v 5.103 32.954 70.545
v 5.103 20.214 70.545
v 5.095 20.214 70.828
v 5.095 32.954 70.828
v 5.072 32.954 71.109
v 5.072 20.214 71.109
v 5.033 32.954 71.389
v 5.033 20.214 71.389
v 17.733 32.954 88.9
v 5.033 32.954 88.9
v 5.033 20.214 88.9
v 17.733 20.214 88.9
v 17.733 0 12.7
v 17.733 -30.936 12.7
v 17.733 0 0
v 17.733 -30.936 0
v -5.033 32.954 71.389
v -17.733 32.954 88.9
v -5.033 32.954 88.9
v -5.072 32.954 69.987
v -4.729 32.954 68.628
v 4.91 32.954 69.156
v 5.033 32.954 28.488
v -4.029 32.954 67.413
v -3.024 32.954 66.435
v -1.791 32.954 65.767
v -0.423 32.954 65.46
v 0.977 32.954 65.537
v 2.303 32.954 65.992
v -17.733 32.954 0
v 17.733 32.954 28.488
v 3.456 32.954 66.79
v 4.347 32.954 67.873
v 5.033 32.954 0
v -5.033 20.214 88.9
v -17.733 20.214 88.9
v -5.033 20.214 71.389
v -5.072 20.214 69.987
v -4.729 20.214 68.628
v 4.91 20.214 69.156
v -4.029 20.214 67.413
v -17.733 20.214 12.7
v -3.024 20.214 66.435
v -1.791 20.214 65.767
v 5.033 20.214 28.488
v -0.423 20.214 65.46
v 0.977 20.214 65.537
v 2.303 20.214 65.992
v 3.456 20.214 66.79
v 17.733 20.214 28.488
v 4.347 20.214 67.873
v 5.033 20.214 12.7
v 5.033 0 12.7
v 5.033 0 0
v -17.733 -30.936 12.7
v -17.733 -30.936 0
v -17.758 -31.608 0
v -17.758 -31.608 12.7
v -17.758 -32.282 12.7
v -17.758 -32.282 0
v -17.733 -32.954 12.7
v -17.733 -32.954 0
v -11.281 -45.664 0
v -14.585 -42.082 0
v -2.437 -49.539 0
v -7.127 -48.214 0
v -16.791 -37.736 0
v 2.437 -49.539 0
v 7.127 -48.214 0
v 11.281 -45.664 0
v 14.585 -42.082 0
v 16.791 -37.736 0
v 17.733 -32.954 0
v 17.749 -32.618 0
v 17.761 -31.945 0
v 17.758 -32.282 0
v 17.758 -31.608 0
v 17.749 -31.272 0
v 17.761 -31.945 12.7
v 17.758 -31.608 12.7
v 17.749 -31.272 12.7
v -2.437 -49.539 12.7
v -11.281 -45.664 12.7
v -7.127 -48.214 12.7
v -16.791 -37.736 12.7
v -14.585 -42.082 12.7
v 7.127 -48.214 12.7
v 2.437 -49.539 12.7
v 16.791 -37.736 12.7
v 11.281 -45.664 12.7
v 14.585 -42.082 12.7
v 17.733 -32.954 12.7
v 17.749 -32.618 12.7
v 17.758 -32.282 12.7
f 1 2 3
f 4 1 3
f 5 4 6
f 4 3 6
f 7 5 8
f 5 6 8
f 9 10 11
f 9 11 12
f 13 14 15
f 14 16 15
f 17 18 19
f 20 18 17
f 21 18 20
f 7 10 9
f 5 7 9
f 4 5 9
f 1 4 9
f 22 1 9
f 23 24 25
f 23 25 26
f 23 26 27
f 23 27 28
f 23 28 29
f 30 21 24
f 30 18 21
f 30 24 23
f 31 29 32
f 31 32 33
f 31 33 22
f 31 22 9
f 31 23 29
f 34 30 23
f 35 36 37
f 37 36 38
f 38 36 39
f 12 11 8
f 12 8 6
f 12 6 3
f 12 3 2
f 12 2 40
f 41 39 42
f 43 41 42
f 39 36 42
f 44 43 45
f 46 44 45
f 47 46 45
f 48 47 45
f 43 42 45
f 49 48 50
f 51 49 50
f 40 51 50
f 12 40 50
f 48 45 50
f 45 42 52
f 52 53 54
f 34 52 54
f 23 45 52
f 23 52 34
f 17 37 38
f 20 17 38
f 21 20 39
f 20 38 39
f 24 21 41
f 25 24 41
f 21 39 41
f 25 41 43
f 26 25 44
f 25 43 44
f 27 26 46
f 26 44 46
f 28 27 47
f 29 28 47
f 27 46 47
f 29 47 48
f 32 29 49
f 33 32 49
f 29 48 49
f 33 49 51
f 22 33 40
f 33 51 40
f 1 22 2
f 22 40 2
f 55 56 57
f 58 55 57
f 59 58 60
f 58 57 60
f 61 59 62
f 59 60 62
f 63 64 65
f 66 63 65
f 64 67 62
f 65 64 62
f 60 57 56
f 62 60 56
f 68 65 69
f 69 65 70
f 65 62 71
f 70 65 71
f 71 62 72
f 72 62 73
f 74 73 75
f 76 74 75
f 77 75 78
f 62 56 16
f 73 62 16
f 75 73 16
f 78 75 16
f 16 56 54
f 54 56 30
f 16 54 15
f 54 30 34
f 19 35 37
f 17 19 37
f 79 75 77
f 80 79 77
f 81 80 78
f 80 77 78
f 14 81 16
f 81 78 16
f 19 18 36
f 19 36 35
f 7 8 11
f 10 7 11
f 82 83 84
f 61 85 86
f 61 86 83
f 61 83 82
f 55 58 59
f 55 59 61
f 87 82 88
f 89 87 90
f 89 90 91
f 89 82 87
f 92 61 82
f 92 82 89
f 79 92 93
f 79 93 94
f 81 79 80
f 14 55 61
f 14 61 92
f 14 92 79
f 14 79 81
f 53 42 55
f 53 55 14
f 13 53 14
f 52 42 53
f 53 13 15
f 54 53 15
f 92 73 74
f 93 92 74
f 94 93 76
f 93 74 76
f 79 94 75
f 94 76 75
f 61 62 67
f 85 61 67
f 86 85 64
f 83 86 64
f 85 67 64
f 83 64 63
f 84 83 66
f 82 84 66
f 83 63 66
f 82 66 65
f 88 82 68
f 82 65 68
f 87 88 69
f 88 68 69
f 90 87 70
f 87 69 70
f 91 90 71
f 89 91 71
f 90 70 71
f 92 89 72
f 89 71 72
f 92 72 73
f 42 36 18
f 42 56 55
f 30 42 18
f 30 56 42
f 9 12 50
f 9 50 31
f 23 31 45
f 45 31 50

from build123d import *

# Parameters (mm, degrees)
F1_DEPTH = 12.7
F2_W     = 35.4655683041
F2_H     = 12.740496546
F3_DEPTH = 76.2
F5_DEPTH = 25.4
F7_DEPTH = 12.7


with BuildPart() as f1:
    # F0 (on Top) → F1 (new body)
    with BuildSketch(Plane.XY):
        with BuildLine():
            Line((-17.732784152, -30.9358154462), (-17.732784152, -32.9542048275))
            Line((-17.732784152, -32.9542048275), (17.732784152, -32.9542048275))
            Line((17.732784152, -32.9542048275), (17.732784152, -30.9358154462))
            ThreePointArc((17.732784152, -30.9358154462), (0, -14.1835319409), (-17.732784152, -30.9358154462))
        make_face()
        with BuildLine():
            ThreePointArc((-17.732784152, -30.9358154462), (-17.761478196, -31.9450101369), (-17.732784152, -32.9542048275))
            Line((-17.732784152, -32.9542048275), (-17.732784152, -30.9358154462))
        make_face()
        with BuildLine():
            Line((17.732784152, -32.9542048275), (-17.732784152, -32.9542048275))
            ThreePointArc((-17.732784152, -32.9542048275), (0, -49.7064883328), (17.732784152, -32.9542048275))
        make_face()
        with BuildLine():
            Line((17.732784152, -30.9358154462), (17.732784152, -32.9542048275))
            ThreePointArc((17.732784152, -32.9542048275), (17.7543032358, -32.4498114027), (17.761478196, -31.9450101369))
            ThreePointArc((17.761478196, -31.9450101369), (17.7543032358, -31.440208871), (17.732784152, -30.9358154462))
        make_face()
        with BuildLine():
            Line((-17.732784152, 32.9542048275), (-17.732784152, -30.9358154462))
            ThreePointArc((-17.732784152, -30.9358154462), (0, -14.1835319409), (17.732784152, -30.9358154462))
            Line((17.732784152, -30.9358154462), (17.732784152, 32.9542048275))
            Line((17.732784152, 32.9542048275), (-17.732784152, 32.9542048275))
        make_face()
    extrude(amount=F1_DEPTH)

    # F2 (on face) → F3 (join)
    with BuildSketch(Plane.XY.offset(12.7)):
        with Locations((0, 26.5839565545)):
            Rectangle(F2_W, F2_H)
    extrude(amount=F3_DEPTH)

    # F4 (on face) → F5 (cut)
    with BuildSketch(Plane.XZ.offset(-20.2137082815)):
        with BuildLine():
            Line((5.032784152, 88.9), (-5.032784152, 88.9))
            Line((-5.032784152, 88.9), (-5.032784152, 71.3885948062))
            ThreePointArc((-5.032784152, 71.3885948062), (0, 75.6482347117), (5.032784152, 71.3885948062))
            Line((5.032784152, 71.3885948062), (5.032784152, 88.9))
        make_face()
        with BuildLine():
            ThreePointArc((5.032784152, 71.3885948062), (0, 75.6482347117), (-5.032784152, 71.3885948062))
            Line((-5.032784152, 71.3885948062), (5.032784152, 71.3885948062))
        make_face()
        with BuildLine():
            Line((5.032784152, 71.3885948062), (-5.032784152, 71.3885948062))
            ThreePointArc((-5.032784152, 71.3885948062), (-0.4231113675, 65.4599085761), (5.1029487715, 70.5452859402))
            ThreePointArc((5.1029487715, 70.5452859402), (5.0853773641, 70.9683973077), (5.032784152, 71.3885948062))
        make_face()
    extrude(amount=-F5_DEPTH, mode=Mode.SUBTRACT)

    # F6 (on face) → F7 (cut)
    with BuildSketch(Plane.YZ.offset(17.732784152)):
        Polygon((0, 0), (32.9542048275, 0), (32.9542048275, 28.4884087741), (20.2137082815, 28.4884087741), (20.2137082815, 12.7), (0, 12.7), align=None)
    extrude(amount=-F7_DEPTH, mode=Mode.SUBTRACT)


solid = f1.part
